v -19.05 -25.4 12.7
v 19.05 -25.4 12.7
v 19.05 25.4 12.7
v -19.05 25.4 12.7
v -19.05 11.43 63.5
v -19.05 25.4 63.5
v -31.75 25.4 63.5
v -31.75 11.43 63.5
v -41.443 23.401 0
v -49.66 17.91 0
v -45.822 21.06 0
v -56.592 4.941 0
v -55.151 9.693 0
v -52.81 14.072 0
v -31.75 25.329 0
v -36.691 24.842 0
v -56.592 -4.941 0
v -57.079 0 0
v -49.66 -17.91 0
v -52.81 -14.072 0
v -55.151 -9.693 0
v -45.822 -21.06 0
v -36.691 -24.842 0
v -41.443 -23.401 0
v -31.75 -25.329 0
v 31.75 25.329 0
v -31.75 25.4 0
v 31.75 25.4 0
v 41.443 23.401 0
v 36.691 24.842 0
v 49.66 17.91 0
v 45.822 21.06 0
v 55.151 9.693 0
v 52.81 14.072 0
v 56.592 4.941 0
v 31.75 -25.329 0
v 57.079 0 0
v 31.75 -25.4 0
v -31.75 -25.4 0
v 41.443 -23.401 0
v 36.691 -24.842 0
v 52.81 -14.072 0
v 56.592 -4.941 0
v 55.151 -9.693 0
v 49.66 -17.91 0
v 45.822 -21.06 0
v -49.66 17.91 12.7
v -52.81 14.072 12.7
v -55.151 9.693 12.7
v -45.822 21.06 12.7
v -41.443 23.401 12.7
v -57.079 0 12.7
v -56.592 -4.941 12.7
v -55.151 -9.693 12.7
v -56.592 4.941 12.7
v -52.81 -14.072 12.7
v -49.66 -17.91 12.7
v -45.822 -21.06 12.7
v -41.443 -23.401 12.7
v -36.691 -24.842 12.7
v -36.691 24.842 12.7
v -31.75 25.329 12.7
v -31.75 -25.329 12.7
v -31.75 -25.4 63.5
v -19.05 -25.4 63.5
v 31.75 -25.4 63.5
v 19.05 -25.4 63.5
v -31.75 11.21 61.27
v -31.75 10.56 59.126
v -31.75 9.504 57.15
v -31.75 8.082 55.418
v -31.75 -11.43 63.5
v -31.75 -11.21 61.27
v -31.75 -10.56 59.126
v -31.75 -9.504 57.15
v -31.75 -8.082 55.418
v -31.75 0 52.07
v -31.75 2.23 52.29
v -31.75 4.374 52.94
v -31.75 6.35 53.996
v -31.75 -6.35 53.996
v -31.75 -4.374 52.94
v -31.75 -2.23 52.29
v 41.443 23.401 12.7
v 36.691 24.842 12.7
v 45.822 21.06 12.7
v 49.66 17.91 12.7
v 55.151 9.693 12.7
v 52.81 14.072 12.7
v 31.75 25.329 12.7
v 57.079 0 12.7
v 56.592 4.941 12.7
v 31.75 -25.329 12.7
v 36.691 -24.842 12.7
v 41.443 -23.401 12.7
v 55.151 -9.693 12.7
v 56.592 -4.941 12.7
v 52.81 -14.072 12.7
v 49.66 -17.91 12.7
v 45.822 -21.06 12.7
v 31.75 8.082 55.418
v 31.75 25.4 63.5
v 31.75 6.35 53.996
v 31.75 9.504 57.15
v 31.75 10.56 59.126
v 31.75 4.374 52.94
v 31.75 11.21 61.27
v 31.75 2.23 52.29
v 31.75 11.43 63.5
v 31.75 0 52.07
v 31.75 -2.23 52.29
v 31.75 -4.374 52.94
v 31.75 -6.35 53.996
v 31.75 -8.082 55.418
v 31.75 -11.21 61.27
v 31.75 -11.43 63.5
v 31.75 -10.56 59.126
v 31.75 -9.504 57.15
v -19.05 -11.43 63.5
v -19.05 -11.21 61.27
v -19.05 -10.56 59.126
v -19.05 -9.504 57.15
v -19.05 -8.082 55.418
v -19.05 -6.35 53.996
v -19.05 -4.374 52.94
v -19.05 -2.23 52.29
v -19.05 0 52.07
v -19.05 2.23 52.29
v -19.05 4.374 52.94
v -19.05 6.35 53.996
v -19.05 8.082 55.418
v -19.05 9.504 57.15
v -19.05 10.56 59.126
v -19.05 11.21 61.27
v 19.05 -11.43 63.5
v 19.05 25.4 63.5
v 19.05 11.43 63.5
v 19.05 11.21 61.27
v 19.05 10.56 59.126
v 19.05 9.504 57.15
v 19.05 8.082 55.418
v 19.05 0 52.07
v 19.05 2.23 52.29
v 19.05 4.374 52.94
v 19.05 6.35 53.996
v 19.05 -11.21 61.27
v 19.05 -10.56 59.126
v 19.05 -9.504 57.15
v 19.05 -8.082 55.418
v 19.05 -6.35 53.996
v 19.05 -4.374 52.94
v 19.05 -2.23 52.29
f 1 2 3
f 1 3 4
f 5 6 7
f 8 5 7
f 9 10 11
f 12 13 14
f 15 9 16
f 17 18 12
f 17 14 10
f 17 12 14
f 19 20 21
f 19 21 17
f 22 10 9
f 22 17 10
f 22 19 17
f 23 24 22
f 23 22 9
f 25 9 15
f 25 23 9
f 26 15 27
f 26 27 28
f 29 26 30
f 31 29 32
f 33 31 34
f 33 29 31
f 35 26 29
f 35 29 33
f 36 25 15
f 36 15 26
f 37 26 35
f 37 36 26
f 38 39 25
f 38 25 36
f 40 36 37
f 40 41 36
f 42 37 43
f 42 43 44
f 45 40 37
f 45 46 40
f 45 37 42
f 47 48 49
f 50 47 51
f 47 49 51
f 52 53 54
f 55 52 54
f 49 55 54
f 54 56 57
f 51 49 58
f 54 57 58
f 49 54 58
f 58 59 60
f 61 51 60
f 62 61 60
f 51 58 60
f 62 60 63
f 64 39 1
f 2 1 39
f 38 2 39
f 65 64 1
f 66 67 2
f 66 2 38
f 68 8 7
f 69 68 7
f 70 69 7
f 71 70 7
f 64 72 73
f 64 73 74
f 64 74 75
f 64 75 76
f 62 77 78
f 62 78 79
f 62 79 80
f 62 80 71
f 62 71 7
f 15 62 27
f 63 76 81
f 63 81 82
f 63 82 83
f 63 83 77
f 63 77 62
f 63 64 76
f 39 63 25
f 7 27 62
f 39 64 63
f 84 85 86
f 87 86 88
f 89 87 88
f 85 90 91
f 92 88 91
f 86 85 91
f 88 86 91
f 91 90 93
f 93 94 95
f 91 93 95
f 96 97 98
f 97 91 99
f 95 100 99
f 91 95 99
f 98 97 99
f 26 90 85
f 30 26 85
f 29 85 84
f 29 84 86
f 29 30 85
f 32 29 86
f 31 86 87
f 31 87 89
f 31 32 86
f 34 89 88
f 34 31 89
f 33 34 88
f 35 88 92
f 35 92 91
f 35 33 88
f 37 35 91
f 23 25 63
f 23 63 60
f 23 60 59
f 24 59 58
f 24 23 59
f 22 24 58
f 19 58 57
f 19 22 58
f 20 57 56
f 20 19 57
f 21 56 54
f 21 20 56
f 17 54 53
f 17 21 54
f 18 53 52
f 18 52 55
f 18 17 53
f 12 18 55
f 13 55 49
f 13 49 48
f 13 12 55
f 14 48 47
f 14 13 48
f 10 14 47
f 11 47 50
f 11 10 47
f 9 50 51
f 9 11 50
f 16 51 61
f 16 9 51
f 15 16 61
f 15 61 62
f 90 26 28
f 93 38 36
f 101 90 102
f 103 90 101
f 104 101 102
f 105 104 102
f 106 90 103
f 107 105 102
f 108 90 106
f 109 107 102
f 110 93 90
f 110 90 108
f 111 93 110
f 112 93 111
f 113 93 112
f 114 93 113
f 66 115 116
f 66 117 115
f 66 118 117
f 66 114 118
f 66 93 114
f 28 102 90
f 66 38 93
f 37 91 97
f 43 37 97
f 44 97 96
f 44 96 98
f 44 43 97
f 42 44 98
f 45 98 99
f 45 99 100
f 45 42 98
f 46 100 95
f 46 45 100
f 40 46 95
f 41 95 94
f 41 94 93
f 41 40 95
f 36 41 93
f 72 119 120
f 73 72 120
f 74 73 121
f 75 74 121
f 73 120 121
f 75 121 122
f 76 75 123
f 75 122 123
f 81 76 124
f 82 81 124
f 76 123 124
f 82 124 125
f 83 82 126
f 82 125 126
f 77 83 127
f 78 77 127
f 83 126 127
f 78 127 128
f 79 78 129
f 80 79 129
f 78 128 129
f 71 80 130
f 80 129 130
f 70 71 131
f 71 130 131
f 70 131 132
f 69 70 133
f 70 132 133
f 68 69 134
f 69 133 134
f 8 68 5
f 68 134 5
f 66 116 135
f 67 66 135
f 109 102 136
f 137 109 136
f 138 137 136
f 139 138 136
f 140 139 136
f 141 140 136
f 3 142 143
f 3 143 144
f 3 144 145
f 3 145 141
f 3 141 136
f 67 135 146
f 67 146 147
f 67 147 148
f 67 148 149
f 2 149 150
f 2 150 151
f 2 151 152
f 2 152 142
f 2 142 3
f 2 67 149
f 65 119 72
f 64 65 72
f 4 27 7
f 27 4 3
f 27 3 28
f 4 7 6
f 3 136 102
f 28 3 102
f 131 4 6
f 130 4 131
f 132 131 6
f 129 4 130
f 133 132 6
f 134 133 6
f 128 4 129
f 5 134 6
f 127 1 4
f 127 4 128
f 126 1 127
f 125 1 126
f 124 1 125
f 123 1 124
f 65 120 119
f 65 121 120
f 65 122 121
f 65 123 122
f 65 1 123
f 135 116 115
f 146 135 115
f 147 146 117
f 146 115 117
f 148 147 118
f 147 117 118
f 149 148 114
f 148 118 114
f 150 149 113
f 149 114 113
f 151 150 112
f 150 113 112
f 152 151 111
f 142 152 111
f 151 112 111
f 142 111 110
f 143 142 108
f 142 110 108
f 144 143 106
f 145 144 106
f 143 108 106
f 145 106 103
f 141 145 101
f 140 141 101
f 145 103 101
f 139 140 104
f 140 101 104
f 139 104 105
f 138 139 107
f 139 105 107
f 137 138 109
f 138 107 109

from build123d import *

# Parameters (mm, degrees)
F1_DEPTH = 25.4
F3_DEPTH = 63.501
F5_DEPTH = 12.7


with BuildPart() as f1:
    # F0 (on Front) → F1 (new body, symmetric)
    with BuildSketch(Plane.XZ):
        Polygon((-31.75, 0), (0, 0), (31.75, 0), (31.75, 63.5), (19.05, 63.5), (19.05, 12.7), (0, 12.7), (-19.05, 12.7), (-19.05, 63.5), (-31.75, 63.5), align=None)
    extrude(amount=F1_DEPTH, both=True)

    # F2 (on face) → F3 (cut, through all)
    with BuildSketch(Plane.YZ.offset(31.75)):
        with BuildLine():
            ThreePointArc((-11.43, 63.5), (0, 52.07), (11.43, 63.5))
            Line((11.43, 63.5), (-11.43, 63.5))
        make_face()
    extrude(amount=-F3_DEPTH, mode=Mode.SUBTRACT)

    # F4 (on face) → F5 (join)
    with BuildSketch(Plane(origin=(0, 0, 0), x_dir=(1, 0, 0), z_dir=(0, 0, -1))):
        with BuildLine():
            ThreePointArc((-31.75, -25.3289327497), (-13.8397398924, -17.9102601076), (-6.4210672503, 0))
            ThreePointArc((-6.4210672503, 0), (-13.8397398924, 17.9102601076), (-31.75, 25.3289327497))
            Line((-31.75, 25.3289327497), (-31.75, -25.3289327497))
        make_face()
        with BuildLine():
            Line((-31.75, -25.3289327497), (-31.75, 25.3289327497))
            ThreePointArc((-31.75, 25.3289327497), (-57.0789327497, 0), (-31.75, -25.3289327497))
        make_face()
        with BuildLine():
            ThreePointArc((57.0789327497, 0), (49.6602601076, 17.9102601076), (31.75, 25.3289327497))
            Line((31.75, 25.3289327497), (31.75, -25.3289327497))
            ThreePointArc((31.75, -25.3289327497), (49.6602601076, -17.9102601076), (57.0789327497, 0))
        make_face()
    extrude(amount=-F5_DEPTH)


solid = f1.part
